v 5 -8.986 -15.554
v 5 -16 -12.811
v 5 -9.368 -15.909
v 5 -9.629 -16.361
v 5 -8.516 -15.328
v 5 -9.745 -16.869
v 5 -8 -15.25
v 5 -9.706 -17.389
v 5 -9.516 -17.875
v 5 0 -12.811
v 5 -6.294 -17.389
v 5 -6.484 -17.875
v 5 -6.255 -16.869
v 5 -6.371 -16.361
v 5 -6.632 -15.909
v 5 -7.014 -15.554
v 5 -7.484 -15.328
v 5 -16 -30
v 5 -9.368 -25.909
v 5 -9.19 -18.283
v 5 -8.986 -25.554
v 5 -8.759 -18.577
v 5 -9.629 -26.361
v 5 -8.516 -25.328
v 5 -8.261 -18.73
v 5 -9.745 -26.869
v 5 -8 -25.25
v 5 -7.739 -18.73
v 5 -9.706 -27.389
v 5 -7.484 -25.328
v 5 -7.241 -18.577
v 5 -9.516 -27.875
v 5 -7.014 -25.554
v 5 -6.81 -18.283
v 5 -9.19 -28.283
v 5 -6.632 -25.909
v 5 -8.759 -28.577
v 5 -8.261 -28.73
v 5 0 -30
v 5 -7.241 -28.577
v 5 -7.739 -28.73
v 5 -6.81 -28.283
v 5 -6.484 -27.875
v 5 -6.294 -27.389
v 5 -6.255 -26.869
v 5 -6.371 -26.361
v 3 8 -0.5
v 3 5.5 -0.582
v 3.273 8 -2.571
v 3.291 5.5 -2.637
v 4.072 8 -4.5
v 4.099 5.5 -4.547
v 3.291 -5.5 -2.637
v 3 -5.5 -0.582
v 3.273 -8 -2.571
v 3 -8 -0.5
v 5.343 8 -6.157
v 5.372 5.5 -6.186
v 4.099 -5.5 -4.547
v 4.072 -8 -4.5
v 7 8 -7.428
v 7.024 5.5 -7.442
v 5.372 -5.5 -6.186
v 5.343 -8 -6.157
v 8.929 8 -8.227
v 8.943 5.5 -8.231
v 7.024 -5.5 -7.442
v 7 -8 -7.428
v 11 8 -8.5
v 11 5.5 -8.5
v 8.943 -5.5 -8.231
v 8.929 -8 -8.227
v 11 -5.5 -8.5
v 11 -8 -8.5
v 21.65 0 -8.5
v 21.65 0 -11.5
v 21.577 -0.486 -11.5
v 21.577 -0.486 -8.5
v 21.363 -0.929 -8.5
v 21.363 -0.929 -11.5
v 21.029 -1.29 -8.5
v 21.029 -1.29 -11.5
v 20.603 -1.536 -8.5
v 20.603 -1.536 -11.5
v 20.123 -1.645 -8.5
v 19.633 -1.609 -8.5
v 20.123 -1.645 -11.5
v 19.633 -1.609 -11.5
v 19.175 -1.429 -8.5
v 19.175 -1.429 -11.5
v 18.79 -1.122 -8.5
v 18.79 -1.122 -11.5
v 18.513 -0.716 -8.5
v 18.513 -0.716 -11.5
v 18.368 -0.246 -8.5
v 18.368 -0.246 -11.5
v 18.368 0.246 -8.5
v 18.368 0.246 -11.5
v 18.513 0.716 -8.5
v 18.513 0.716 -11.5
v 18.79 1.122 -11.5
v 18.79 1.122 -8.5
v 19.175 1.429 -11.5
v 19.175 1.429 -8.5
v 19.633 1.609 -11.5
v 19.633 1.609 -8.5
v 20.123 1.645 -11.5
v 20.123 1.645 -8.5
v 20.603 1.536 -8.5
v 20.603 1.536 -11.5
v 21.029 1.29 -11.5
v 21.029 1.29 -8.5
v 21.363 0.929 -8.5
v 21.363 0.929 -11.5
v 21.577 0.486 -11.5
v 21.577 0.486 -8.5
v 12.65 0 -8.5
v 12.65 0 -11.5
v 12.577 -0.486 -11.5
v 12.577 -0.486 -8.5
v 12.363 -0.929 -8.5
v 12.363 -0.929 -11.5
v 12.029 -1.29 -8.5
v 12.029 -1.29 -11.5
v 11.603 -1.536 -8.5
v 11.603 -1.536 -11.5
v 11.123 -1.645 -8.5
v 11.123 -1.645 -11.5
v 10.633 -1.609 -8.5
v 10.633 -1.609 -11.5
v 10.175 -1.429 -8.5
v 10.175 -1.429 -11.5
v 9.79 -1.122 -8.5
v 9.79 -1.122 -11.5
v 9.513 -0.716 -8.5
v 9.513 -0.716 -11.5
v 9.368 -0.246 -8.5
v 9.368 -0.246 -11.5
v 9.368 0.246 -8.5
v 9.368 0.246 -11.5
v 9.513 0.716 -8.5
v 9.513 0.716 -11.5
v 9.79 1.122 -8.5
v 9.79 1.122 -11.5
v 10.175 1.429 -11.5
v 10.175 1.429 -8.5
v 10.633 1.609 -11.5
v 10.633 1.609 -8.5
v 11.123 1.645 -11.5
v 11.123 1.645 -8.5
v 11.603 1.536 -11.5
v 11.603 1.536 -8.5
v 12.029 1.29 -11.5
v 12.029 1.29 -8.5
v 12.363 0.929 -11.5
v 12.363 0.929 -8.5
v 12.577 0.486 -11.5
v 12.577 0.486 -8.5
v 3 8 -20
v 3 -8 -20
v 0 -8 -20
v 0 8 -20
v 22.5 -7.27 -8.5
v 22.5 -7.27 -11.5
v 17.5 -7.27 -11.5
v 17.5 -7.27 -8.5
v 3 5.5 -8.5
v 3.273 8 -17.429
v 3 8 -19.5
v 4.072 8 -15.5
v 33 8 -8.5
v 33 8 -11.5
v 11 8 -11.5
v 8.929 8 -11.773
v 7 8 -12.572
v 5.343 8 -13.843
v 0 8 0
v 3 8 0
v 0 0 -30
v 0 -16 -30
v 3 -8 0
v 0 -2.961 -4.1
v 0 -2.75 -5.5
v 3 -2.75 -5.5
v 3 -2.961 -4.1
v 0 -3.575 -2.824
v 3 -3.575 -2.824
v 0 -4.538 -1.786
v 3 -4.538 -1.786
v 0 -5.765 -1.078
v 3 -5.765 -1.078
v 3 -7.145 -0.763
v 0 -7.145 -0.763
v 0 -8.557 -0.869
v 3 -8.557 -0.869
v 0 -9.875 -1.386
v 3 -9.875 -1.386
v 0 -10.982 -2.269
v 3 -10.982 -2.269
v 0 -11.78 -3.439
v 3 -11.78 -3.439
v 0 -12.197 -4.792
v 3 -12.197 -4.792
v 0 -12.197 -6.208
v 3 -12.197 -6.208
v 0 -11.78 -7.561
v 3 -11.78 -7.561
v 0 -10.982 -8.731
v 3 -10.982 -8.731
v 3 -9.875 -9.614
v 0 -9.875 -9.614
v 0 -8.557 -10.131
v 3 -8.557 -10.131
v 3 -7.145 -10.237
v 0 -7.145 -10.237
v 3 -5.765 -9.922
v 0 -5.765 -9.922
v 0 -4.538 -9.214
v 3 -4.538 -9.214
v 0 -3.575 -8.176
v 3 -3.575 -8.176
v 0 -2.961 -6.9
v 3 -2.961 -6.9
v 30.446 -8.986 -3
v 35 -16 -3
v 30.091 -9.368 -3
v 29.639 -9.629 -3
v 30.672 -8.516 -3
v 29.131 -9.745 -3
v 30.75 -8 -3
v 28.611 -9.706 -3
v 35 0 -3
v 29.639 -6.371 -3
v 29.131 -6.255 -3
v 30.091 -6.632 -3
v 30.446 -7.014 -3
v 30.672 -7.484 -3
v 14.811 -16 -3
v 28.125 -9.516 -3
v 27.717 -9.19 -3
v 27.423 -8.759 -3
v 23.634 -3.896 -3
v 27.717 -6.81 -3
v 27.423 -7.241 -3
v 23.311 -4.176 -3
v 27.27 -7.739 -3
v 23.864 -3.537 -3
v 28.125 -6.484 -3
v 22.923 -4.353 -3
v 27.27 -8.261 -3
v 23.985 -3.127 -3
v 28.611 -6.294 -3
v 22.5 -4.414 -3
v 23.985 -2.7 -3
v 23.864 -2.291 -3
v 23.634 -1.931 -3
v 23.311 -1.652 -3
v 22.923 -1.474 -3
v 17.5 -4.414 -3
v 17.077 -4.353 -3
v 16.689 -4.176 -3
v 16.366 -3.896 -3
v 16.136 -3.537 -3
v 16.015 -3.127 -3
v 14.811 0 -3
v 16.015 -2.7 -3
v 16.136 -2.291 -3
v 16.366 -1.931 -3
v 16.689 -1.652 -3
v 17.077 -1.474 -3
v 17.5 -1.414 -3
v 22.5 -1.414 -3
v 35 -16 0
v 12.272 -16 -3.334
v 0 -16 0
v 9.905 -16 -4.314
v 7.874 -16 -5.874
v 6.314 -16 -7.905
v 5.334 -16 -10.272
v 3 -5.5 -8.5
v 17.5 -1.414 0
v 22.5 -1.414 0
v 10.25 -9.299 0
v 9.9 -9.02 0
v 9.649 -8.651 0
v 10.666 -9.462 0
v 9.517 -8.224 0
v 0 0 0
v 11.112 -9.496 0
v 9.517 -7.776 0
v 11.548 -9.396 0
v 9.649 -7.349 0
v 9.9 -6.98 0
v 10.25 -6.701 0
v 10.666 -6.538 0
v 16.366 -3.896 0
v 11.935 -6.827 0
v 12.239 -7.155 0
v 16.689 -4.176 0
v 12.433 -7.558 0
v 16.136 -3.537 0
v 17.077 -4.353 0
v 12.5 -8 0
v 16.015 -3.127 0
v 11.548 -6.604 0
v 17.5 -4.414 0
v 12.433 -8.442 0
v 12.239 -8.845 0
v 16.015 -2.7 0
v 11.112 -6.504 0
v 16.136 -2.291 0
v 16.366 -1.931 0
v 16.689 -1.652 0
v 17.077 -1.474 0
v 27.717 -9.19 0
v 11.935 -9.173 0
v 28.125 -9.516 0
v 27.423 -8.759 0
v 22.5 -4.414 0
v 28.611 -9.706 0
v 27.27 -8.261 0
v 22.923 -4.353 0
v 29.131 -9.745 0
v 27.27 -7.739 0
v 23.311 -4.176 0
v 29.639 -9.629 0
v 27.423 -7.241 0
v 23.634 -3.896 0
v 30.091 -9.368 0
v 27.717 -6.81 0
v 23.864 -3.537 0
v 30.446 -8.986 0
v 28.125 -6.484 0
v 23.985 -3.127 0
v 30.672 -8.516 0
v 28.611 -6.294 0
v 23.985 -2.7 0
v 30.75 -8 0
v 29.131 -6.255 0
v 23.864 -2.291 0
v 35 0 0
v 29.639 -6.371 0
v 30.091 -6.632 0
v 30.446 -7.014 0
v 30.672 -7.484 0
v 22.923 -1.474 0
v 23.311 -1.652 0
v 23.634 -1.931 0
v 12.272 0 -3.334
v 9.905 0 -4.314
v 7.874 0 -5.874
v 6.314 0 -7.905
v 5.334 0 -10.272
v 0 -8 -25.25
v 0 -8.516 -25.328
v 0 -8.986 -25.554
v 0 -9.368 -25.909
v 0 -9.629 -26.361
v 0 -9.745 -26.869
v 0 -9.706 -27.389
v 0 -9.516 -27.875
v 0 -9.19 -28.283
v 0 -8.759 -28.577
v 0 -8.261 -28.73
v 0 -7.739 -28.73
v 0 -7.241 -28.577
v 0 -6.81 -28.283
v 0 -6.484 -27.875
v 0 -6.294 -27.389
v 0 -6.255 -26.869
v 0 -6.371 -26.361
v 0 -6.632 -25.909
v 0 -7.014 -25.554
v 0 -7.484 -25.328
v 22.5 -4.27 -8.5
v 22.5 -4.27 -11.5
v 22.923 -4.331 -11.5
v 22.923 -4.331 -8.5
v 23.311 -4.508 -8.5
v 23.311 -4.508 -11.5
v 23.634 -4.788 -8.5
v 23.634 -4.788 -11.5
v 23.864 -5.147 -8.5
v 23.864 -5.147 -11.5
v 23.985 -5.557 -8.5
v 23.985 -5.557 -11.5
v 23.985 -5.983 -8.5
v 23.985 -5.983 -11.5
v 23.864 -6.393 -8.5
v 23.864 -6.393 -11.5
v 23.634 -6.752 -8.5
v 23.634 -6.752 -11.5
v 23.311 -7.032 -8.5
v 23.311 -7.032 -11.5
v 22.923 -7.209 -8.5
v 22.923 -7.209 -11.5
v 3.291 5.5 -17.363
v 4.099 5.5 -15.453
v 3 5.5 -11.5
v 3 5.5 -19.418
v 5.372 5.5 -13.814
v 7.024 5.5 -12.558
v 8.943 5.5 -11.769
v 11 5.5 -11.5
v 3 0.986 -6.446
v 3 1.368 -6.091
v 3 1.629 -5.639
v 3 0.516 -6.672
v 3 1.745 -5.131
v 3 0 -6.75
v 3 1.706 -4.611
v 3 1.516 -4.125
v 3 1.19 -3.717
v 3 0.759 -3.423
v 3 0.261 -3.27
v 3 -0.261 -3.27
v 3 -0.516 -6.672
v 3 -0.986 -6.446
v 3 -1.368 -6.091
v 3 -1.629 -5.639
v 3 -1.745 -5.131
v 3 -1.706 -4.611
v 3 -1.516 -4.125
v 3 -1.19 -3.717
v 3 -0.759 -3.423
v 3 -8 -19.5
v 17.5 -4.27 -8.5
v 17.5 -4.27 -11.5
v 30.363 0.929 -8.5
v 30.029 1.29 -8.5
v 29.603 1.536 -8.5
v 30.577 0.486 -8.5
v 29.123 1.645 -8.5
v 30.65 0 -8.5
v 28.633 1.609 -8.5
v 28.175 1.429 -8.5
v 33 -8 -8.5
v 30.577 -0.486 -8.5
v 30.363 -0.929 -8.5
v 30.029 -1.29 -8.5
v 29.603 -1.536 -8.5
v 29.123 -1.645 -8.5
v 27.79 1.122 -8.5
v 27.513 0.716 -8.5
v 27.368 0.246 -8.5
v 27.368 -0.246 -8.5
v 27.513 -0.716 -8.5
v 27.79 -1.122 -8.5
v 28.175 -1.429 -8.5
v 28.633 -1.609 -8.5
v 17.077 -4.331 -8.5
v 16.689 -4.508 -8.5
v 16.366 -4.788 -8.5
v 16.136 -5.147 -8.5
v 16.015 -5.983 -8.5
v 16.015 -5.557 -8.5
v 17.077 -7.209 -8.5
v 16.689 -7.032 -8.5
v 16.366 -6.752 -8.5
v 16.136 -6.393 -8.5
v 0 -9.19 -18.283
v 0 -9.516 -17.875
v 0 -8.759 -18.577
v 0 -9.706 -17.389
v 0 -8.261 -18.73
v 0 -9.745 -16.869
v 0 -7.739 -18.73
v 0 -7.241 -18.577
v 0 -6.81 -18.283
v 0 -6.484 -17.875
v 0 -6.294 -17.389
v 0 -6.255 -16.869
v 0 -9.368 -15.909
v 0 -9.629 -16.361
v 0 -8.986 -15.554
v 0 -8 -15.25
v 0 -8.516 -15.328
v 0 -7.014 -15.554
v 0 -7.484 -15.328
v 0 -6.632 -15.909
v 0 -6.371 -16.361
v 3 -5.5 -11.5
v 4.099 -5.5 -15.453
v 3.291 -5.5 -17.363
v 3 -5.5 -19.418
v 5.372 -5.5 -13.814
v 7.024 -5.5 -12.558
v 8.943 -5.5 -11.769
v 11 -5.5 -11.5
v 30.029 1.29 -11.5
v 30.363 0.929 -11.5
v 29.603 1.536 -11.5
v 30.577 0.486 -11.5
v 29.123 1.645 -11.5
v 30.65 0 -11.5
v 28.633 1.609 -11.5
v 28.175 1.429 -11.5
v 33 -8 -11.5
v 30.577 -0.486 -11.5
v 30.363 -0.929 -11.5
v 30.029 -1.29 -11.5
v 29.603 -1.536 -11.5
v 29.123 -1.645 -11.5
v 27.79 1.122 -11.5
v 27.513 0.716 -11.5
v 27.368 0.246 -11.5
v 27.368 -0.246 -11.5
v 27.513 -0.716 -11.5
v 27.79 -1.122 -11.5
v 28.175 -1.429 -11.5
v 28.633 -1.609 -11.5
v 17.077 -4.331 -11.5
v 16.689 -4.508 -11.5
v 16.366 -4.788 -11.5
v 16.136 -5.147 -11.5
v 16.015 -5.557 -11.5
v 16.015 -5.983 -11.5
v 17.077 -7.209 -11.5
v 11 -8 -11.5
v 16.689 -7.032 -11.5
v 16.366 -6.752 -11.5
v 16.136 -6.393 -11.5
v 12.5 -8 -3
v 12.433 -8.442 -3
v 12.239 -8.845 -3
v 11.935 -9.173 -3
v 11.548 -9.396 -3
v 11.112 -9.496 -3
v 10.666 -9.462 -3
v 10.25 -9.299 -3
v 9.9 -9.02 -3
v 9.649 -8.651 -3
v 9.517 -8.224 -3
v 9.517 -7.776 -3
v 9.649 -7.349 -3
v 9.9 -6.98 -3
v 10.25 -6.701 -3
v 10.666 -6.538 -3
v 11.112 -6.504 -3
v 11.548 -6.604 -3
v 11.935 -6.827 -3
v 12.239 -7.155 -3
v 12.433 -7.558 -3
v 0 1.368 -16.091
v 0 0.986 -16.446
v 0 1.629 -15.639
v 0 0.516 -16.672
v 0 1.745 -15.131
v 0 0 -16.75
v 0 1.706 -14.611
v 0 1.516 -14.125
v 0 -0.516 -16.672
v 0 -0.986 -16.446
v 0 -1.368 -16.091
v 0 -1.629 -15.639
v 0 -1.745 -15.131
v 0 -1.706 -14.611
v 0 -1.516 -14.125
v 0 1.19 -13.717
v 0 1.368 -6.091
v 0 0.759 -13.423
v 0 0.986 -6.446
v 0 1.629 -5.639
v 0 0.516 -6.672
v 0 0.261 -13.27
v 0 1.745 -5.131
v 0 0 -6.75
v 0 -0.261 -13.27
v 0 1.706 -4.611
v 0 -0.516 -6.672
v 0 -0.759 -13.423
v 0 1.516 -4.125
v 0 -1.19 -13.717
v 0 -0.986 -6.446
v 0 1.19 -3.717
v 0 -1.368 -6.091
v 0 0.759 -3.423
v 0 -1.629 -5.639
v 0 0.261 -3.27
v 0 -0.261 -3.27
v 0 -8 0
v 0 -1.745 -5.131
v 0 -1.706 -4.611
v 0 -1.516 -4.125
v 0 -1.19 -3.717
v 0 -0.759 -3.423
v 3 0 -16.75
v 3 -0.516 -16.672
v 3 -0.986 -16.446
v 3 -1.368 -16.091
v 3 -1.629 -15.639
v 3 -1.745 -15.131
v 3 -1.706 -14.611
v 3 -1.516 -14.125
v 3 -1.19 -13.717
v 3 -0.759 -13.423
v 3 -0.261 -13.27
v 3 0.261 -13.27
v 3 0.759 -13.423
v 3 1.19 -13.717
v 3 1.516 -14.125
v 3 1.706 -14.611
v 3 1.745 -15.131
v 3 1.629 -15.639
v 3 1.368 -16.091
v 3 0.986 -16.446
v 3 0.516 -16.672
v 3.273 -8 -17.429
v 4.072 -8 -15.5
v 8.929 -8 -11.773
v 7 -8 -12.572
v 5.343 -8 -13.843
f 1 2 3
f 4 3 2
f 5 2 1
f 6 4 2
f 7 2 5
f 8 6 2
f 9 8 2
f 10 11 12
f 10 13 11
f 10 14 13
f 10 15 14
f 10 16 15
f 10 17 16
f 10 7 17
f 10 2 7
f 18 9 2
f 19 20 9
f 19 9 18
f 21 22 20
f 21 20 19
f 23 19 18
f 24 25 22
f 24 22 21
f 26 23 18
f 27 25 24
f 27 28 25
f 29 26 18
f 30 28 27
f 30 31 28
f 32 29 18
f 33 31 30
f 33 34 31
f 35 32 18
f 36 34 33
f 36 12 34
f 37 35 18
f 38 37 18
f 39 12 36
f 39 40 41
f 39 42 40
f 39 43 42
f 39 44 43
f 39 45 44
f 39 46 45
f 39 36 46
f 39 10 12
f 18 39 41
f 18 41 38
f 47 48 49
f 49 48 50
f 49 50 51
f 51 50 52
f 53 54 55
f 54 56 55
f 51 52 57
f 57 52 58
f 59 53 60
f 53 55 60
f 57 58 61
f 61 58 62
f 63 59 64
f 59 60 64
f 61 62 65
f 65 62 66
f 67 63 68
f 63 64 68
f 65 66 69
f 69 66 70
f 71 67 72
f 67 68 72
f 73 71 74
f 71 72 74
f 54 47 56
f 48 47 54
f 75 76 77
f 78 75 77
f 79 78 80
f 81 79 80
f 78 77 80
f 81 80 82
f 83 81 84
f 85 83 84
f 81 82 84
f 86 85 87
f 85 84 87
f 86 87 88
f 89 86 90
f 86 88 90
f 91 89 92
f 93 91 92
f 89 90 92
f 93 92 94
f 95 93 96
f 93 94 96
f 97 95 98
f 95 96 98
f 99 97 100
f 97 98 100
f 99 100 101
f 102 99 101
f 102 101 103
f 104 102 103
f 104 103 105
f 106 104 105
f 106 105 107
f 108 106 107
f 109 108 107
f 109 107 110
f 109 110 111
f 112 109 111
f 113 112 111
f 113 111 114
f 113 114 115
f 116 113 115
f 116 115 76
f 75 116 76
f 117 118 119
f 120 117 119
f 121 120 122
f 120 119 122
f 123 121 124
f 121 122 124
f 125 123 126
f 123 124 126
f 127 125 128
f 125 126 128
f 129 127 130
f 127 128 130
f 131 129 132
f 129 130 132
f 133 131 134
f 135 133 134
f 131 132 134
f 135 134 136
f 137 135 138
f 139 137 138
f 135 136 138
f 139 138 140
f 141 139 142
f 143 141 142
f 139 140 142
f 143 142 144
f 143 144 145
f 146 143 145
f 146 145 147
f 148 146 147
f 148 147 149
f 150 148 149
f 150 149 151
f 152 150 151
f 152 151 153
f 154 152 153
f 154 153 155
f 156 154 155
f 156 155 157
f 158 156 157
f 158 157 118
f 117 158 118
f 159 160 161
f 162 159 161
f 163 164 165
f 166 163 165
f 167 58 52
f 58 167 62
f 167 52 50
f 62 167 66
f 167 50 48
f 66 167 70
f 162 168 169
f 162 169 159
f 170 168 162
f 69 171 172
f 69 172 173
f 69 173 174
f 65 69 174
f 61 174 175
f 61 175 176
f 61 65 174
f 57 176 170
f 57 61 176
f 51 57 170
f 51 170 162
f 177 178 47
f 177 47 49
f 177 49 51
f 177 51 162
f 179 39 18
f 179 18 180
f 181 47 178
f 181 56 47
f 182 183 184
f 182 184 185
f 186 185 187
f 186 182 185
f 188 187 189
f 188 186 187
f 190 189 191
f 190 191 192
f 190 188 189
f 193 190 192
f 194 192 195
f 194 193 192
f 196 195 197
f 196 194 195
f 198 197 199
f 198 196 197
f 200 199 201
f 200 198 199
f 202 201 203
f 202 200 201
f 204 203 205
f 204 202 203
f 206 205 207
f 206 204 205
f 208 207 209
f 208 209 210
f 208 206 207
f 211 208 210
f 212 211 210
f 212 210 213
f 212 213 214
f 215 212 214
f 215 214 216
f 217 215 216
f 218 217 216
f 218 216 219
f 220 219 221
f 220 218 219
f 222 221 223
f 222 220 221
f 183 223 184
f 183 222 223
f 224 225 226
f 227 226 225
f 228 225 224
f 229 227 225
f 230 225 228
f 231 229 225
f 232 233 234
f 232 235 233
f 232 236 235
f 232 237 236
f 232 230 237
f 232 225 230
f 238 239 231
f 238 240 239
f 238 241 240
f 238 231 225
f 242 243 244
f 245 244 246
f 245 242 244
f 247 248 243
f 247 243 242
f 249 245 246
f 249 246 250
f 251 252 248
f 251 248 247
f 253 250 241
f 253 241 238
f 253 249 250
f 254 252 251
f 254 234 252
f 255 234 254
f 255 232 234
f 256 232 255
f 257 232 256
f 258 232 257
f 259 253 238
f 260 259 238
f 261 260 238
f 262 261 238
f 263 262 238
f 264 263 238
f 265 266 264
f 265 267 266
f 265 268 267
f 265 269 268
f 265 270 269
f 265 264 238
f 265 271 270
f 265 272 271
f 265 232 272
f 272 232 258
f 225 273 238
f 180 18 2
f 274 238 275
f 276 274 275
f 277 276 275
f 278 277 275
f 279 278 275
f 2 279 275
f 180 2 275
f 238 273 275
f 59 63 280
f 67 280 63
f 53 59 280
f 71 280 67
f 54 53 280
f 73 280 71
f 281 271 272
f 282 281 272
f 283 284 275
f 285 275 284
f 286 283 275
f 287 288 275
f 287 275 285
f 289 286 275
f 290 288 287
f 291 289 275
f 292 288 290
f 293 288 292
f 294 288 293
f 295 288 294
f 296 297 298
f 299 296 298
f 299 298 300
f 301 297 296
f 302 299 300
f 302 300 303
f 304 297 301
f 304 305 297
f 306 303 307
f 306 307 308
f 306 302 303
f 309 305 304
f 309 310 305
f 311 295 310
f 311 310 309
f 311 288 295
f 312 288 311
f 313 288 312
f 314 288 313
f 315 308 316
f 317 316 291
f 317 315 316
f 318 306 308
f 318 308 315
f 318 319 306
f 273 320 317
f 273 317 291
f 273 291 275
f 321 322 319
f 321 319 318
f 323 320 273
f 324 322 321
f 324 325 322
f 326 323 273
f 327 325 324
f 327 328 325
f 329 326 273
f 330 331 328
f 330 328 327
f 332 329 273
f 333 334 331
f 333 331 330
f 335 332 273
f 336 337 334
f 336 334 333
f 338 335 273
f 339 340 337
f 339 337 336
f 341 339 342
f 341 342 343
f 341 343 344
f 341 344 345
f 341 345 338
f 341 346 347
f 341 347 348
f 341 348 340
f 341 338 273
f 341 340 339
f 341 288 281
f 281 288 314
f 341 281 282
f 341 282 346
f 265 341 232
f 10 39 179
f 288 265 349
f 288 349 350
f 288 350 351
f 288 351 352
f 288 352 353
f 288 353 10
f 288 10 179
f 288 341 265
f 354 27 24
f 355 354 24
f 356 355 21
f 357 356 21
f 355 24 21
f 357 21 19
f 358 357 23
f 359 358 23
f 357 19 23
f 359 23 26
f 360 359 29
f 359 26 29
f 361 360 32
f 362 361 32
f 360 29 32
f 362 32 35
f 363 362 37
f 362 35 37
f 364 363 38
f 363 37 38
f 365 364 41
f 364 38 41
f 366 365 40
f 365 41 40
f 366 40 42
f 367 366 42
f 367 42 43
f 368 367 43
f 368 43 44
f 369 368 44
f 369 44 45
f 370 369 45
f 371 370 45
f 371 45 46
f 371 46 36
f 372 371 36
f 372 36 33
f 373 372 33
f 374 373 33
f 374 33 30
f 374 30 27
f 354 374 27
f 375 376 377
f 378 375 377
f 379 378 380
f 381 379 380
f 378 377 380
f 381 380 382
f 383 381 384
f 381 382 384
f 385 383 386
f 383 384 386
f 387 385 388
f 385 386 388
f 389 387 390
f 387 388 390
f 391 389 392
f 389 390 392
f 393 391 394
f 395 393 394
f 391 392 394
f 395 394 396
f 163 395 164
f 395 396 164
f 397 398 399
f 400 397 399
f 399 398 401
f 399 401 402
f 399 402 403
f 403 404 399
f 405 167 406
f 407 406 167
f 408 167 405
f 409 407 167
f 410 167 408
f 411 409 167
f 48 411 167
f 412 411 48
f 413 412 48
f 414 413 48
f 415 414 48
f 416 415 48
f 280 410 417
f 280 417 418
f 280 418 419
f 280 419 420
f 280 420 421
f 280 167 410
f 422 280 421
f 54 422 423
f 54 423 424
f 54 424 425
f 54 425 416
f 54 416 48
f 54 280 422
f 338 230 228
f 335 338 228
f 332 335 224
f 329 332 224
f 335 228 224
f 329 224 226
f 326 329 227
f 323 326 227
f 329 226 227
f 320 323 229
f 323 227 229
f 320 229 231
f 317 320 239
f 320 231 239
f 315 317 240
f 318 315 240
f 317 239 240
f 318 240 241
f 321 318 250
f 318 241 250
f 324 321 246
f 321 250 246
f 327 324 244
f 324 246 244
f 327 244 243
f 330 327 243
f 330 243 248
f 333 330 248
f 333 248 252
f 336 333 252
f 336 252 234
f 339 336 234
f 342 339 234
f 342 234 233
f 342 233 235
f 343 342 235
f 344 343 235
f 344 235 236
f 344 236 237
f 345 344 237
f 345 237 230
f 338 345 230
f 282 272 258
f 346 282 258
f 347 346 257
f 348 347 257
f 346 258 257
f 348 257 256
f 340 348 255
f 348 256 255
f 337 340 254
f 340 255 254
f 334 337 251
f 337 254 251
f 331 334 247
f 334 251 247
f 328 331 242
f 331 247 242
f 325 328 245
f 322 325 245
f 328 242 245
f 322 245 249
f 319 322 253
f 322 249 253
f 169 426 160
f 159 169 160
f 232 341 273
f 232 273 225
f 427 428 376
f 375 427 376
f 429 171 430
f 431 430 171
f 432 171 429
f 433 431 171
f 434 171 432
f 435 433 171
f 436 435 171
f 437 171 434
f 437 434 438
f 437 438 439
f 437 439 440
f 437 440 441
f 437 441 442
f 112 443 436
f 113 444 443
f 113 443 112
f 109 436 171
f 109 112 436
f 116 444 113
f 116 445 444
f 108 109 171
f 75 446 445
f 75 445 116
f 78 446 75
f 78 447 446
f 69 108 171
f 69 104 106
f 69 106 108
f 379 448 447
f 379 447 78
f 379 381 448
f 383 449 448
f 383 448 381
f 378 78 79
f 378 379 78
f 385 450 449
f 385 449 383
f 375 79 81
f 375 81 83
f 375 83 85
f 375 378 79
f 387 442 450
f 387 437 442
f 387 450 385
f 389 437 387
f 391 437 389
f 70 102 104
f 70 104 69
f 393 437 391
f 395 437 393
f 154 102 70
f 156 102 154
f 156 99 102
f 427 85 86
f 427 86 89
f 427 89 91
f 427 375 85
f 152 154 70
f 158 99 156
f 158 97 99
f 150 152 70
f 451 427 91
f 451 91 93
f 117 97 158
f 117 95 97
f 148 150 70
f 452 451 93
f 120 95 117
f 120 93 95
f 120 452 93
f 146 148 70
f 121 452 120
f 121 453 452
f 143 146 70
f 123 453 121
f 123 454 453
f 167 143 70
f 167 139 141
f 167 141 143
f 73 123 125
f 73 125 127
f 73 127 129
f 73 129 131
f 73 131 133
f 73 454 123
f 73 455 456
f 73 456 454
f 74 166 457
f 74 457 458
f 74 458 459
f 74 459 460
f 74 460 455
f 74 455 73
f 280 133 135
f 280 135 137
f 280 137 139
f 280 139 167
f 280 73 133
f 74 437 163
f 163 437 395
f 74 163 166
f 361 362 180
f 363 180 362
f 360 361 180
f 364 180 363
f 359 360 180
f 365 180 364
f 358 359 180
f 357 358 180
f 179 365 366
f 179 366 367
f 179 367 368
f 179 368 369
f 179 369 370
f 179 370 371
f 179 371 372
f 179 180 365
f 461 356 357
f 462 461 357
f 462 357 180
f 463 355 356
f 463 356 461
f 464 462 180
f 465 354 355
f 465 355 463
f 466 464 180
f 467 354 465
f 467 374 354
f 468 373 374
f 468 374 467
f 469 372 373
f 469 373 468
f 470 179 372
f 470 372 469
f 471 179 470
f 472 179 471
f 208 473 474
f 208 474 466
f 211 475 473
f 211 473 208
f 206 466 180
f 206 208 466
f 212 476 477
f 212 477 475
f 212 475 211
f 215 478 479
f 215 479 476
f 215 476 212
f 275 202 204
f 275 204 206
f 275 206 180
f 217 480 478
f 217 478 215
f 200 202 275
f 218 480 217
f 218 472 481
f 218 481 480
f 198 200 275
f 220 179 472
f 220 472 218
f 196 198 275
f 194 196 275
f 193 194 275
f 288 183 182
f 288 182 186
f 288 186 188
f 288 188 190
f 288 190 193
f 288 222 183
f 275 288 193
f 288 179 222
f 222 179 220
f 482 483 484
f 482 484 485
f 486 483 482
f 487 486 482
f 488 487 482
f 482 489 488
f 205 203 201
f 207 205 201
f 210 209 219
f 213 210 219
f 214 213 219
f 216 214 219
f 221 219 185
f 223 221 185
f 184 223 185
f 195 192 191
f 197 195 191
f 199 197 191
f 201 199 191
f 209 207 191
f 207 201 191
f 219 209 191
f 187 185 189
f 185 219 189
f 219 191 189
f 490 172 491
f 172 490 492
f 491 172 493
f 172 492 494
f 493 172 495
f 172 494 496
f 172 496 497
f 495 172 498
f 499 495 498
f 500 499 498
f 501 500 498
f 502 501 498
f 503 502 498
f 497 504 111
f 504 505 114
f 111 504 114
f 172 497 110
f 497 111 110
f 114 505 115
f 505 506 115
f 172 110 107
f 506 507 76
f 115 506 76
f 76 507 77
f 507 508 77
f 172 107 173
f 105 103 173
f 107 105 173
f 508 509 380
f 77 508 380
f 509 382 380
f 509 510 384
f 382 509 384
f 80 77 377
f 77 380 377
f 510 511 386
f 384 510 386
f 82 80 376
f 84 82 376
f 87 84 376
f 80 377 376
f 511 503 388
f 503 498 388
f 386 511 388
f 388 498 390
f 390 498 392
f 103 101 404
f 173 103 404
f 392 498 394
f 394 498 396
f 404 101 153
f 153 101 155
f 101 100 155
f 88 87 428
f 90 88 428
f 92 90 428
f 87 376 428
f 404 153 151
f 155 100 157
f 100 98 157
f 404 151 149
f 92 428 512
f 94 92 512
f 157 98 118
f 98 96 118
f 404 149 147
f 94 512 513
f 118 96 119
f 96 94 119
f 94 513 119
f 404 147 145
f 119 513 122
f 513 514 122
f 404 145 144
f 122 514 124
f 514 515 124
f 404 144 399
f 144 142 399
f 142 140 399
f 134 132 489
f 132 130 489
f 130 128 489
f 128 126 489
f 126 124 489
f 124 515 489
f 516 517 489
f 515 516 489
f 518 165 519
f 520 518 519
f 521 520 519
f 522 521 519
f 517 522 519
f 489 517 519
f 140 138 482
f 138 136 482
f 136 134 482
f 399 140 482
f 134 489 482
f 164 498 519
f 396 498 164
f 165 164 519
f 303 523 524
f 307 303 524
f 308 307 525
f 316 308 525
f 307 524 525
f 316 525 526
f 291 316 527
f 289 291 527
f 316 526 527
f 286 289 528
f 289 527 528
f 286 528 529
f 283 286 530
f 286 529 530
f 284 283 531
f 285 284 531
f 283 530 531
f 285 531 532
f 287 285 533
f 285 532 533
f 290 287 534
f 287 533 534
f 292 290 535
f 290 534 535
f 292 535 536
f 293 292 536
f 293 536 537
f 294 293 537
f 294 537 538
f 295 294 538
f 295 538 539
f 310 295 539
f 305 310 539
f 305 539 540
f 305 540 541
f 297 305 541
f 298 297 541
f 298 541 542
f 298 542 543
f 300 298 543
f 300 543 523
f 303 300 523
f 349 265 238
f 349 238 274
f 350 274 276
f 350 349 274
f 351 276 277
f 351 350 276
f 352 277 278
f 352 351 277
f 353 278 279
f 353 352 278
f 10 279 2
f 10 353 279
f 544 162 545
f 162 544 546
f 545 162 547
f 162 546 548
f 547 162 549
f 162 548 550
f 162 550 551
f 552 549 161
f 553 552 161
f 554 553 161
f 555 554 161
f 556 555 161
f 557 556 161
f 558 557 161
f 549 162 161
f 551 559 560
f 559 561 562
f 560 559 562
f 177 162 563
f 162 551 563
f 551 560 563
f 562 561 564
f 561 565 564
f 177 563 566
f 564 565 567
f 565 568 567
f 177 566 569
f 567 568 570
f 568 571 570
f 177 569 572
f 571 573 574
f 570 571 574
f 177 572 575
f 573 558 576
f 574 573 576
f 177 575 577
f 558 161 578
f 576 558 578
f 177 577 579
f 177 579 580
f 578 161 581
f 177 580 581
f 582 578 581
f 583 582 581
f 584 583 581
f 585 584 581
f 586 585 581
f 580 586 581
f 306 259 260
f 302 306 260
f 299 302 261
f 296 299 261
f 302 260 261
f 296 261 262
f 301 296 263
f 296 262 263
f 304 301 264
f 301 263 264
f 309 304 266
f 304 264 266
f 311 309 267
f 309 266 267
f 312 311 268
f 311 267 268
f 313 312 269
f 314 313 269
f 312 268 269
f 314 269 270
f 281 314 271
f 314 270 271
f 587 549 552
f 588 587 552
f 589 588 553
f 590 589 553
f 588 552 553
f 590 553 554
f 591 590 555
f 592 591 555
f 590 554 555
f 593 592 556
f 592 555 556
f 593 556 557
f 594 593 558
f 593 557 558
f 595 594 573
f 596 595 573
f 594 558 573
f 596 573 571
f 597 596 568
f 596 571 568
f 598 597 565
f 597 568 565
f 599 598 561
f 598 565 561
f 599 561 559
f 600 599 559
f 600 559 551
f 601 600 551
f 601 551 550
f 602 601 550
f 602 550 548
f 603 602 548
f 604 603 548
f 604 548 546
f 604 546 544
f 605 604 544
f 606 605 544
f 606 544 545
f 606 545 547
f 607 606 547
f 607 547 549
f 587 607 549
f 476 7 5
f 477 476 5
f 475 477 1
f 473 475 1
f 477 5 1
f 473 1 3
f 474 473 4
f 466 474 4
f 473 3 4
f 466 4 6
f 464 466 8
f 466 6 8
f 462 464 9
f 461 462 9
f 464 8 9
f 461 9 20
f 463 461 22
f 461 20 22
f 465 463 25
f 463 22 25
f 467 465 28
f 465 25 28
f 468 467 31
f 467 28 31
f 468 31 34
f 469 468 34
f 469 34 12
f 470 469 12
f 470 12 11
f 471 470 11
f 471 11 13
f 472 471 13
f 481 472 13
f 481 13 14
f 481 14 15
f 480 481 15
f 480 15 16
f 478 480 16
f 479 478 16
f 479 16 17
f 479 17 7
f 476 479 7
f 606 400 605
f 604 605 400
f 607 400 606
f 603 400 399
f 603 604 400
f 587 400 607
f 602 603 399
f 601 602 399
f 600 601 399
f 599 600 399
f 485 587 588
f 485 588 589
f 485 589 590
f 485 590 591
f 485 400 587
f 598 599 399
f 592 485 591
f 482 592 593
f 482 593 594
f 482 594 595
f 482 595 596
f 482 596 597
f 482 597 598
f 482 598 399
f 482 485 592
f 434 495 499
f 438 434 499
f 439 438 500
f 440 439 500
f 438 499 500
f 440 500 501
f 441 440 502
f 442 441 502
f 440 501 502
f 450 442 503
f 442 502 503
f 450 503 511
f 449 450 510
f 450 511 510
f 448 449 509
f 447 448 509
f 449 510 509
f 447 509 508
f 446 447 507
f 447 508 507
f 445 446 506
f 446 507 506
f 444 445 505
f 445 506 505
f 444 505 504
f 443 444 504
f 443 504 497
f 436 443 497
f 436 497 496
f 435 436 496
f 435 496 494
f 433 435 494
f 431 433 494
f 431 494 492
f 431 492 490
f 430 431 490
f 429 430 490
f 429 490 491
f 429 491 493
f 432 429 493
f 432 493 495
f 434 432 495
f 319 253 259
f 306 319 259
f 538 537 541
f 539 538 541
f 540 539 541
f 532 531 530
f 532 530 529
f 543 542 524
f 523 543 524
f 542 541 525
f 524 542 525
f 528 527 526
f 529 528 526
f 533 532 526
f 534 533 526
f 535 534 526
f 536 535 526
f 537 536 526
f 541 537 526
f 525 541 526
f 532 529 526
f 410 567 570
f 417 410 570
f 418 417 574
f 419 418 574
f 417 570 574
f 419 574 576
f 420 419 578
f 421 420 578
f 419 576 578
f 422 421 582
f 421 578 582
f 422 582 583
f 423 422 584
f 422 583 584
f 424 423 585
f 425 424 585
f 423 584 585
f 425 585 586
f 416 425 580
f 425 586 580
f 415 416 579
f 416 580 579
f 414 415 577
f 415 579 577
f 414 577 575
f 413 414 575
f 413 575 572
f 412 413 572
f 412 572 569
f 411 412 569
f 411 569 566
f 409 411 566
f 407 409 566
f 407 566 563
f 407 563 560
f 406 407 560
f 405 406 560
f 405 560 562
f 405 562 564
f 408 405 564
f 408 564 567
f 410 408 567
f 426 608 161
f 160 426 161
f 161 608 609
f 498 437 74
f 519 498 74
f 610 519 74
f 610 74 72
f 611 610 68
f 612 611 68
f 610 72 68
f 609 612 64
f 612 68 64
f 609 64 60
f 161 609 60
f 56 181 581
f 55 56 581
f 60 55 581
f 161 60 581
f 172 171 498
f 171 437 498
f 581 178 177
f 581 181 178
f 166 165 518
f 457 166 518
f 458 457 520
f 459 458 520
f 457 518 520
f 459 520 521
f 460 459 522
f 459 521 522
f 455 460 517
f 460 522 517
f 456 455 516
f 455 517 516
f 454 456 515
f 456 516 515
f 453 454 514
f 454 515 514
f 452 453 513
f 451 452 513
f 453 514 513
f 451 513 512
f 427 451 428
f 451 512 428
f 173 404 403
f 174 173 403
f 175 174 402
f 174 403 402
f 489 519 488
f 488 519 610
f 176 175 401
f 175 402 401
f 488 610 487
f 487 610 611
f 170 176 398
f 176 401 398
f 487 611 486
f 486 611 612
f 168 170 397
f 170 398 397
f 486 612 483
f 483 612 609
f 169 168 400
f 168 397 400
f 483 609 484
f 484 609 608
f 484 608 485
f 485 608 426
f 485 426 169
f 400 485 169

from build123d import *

# Parameters (mm, degrees)
PAD_DEPTH       = 8
SKETCH001_R     = 1.65
POCKET_DEPTH    = 11.501
SKETCH002_R     = 1.75
POCKET001_DEPTH = 33.001
SKETCH004_W     = 7.917855
SKETCH004_H     = 11
POCKET003_DEPTH = 8
PAD001_DEPTH    = 16
SKETCH006_R     = 1.5
SKETCH006_R_2   = 1.75
POCKET004_DEPTH = 3.001
SKETCH007_R     = 1.75
POCKET005_DEPTH = 5.001
SKETCH003_R     = 4.75
POCKET002_DEPTH = 3


with BuildPart() as touch_bracket_middle:
    # Sketch → Pad (new body, symmetric)
    with BuildSketch(Plane.XZ):
        with BuildLine():
            Line((0, -20), (0, 0))
            Line((3, 0), (0, 0))
            Line((3, -0.5), (3, 0))
            ThreePointArc((3, -0.5), (5.3431457505, -6.1568542495), (11, -8.5))
            Line((33, -8.5), (11, -8.5))
            Line((33, -8.5), (33, -11.5))
            Line((33, -11.5), (11, -11.5))
            ThreePointArc((11, -11.5), (5.3431457505, -13.8431457505), (3, -19.5))
            Line((3, -19.5), (3, -20))
            Line((3, -20), (0, -20))
        make_face()
    extrude(amount=PAD_DEPTH, both=True)

    # Sketch001 (on Face2 of Pad) → Pocket (cut, through all)
    with BuildSketch(Plane(origin=(0, 0, -11.5), x_dir=(1, 0, 0), z_dir=(0, 0, -1))):
        with Locations((11, 0)):
            Circle(SKETCH001_R)
        with Locations((29, 0)):
            Circle(SKETCH001_R)
        with Locations((20, 0)):
            Circle(SKETCH001_R)
        with BuildLine():
            ThreePointArc((17.5, 7.27), (16, 5.77), (17.5, 4.27))
            Line((17.5, 4.27), (22.5, 4.27))
            ThreePointArc((22.5, 4.27), (24, 5.77), (22.5, 7.27))
            Line((22.5, 7.27), (17.5, 7.27))
        make_face()
    extrude(amount=-POCKET_DEPTH, mode=Mode.SUBTRACT)

    # Sketch002 (on Face17 of Pocket) → Pocket001 (cut, through all)
    with BuildSketch(Plane(origin=(0, 0, 0), x_dir=(0, 0, -1), z_dir=(-1, 0, 0))):
        with Locations((15, 0)):
            Circle(SKETCH002_R)
        with Locations((5, 0)):
            Circle(SKETCH002_R)
    extrude(amount=-POCKET001_DEPTH, mode=Mode.SUBTRACT)

    # Sketch004 → Pocket003 (cut)
    with BuildSketch(Plane(origin=(11, 0, 0), x_dir=(0, 0, 1), z_dir=(1, 0, 0))):
        with Locations((-4.5410725, 0)):
            Rectangle(SKETCH004_W, SKETCH004_H)
        with Locations((-15.4589275, 0)):
            Rectangle(SKETCH004_W, SKETCH004_H)
    extrude(amount=-POCKET003_DEPTH, mode=Mode.SUBTRACT)


with BuildPart() as touch_bracket_high:
    # Sketch005 → Pad001 (new body)
    with BuildSketch(Plane.XZ):
        with BuildLine():
            Line((0, -30), (0, 0))
            Line((0, 0), (35, 0))
            Line((35, 0), (35, -3))
            Line((35, -3), (14.8109245, -3))
            ThreePointArc((14.8109245, -3), (7.8735532563, -5.8735532563), (5, -12.8109245))
            Line((5, -12.8109245), (5, -30))
            Line((5, -30), (0, -30))
        make_face()
    extrude(amount=PAD001_DEPTH)

    # Sketch006 (on Face4 of Pad001) → Pocket004 (cut, through all)
    with BuildSketch(Plane(origin=(0, 0, -3), x_dir=(1, 0, 0), z_dir=(0, 0, -1))):
        with Locations((11, 8)):
            Circle(SKETCH006_R)
        with Locations((29, 8)):
            Circle(SKETCH006_R_2)
        with BuildLine():
            ThreePointArc((17.5, 4.4137121897), (16, 2.9137121897), (17.5, 1.4137121897))
            Line((17.5, 1.4137121897), (22.5, 1.4137121897))
            ThreePointArc((22.5, 1.4137121897), (24, 2.9137121897), (22.5, 4.4137121897))
            Line((22.5, 4.4137121897), (17.5, 4.4137121897))
        make_face()
    extrude(amount=-POCKET004_DEPTH, mode=Mode.SUBTRACT)

    # Sketch007 (on Face6 of Pocket004) → Pocket005 (cut, through all)
    with BuildSketch(Plane(origin=(5, 0, 0), x_dir=(0, 0, 1), z_dir=(1, 0, 0))):
        with Locations((-17, 8)):
            Circle(SKETCH007_R)
        with Locations((-27, 8)):
            Circle(SKETCH007_R)
    extrude(amount=-POCKET005_DEPTH, mode=Mode.SUBTRACT)

    # Sketch003 → Pocket002 (cut)
    with BuildSketch(Plane.YZ):
        with Locations((-7.5, -5.5)):
            Circle(SKETCH003_R)
    extrude(amount=POCKET002_DEPTH, mode=Mode.SUBTRACT)


solid = Compound([touch_bracket_middle.part, touch_bracket_high.part])
